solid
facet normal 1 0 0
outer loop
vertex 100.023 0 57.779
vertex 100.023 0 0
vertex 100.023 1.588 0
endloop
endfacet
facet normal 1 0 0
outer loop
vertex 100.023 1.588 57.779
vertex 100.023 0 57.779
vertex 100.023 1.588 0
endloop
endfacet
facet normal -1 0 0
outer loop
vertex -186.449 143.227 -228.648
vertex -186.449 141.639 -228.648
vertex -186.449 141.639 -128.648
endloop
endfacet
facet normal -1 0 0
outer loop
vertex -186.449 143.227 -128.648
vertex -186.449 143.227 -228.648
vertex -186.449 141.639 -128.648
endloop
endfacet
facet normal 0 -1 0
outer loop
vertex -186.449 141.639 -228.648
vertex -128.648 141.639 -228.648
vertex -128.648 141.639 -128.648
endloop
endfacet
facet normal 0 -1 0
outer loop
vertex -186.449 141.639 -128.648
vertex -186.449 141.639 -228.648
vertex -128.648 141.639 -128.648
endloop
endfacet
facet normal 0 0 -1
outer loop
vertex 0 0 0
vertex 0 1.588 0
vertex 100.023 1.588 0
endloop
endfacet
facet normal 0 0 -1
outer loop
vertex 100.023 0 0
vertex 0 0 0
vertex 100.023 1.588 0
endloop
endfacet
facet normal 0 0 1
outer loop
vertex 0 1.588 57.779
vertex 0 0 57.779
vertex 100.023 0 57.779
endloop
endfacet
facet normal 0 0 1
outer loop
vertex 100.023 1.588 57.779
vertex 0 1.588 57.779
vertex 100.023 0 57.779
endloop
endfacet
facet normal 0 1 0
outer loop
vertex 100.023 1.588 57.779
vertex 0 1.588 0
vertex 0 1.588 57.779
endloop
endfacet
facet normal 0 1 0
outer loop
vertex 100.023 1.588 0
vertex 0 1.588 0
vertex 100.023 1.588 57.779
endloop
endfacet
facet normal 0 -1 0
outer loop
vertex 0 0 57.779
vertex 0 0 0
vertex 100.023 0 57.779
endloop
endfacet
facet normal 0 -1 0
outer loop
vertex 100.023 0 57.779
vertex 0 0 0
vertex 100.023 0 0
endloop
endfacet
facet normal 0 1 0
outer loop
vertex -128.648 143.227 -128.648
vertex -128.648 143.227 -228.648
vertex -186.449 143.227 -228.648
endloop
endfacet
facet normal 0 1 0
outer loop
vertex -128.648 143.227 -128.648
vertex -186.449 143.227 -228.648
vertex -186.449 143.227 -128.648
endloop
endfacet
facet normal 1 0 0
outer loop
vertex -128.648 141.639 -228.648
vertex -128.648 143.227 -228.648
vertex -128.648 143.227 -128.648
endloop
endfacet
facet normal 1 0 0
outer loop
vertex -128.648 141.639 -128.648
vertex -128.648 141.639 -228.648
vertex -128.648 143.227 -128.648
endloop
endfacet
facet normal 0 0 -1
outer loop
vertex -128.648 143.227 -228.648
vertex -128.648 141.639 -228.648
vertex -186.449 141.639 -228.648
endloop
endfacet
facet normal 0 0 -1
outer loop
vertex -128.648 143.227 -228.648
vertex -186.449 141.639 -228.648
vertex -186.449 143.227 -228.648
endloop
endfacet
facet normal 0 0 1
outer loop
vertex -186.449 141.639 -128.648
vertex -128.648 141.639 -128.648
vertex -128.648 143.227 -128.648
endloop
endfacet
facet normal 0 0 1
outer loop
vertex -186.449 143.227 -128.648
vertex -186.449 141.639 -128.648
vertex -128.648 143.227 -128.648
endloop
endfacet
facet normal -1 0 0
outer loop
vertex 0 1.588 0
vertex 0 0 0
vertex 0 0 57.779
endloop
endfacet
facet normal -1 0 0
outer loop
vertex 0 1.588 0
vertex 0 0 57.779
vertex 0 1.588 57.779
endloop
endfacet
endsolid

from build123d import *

# Parameters (mm, degrees)
SKETCH2_W           = 100.022593171
SKETCH2_H           = 1.5875
BOSS_EXTRUDE1_DEPTH = 150
SKETCH3_W           = 100.022593171
SKETCH3_H           = 92.221136112
CUT_EXTRUDE1_DEPTH  = 1.5875
SKETCH4_W           = 100
SKETCH4_H           = 1.5875
BOSS_EXTRUDE2_DEPTH = 100
SKETCH5_W           = 42.198542941
SKETCH5_H           = 100
CUT_EXTRUDE2_DEPTH  = 1.5875


with BuildPart() as part:
    # Sketch2 → Boss-Extrude1 (new body)
    with BuildSketch(Plane.XY):
        with Locations((50.011296586, 0.79375)):
            Rectangle(SKETCH2_W, SKETCH2_H)
    extrude(amount=BOSS_EXTRUDE1_DEPTH)

    # Sketch3 → Cut-Extrude1 (cut)
    with BuildSketch(Plane.XZ):
        with Locations((50.011296586, 103.889431944)):
            Rectangle(SKETCH3_W, SKETCH3_H)
    extrude(amount=-CUT_EXTRUDE1_DEPTH, mode=Mode.SUBTRACT)


with BuildPart() as body_2:
    # Sketch4 → Boss-Extrude2 (new body)
    with BuildSketch(Plane.ZY.offset(128.6475)):
        with Locations((-178.6475, 142.432757657)):
            Rectangle(SKETCH4_W, SKETCH4_H)
    extrude(amount=BOSS_EXTRUDE2_DEPTH)

    # Sketch5 → Cut-Extrude2 (cut)
    with BuildSketch(Plane.XZ.offset(-141.639007657)):
        with Locations((-207.54822853, -178.6475)):
            Rectangle(SKETCH5_W, SKETCH5_H)
    extrude(amount=-CUT_EXTRUDE2_DEPTH, mode=Mode.SUBTRACT)


solid = Compound([part.part, body_2.part])
